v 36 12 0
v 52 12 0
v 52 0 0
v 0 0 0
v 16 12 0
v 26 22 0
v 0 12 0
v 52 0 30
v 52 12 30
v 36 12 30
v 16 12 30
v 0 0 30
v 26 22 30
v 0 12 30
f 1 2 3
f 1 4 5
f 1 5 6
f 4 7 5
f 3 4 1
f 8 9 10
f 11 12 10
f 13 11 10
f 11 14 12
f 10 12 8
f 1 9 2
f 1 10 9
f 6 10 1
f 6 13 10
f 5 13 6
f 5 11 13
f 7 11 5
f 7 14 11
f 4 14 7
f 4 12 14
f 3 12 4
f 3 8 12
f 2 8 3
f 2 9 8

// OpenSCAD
$fn = 32;

// ----------------------------------------------------------------------
// V guide rail: vrib, 52 mm wide
// ----------------------------------------------------------------------

// --- parameters (mm) ---
rail_w = 52;              // rail width, X
base_t = 12;              // base plate thickness
v_depth = 10;             // V feature depth / height
v_half_w = 10;            // half width of the V at the base face
plate_t = 30;             // rail length, Z (the extrusion height)

profile = [[0, 0], [52, 0], [52, 12], [36, 12], [26, 22], [16, 12], [0, 12]];  // primary outline, 7 points, counter clockwise

// --- the one profile operation ---
linear_extrude(height = plate_t) polygon(points = profile);
